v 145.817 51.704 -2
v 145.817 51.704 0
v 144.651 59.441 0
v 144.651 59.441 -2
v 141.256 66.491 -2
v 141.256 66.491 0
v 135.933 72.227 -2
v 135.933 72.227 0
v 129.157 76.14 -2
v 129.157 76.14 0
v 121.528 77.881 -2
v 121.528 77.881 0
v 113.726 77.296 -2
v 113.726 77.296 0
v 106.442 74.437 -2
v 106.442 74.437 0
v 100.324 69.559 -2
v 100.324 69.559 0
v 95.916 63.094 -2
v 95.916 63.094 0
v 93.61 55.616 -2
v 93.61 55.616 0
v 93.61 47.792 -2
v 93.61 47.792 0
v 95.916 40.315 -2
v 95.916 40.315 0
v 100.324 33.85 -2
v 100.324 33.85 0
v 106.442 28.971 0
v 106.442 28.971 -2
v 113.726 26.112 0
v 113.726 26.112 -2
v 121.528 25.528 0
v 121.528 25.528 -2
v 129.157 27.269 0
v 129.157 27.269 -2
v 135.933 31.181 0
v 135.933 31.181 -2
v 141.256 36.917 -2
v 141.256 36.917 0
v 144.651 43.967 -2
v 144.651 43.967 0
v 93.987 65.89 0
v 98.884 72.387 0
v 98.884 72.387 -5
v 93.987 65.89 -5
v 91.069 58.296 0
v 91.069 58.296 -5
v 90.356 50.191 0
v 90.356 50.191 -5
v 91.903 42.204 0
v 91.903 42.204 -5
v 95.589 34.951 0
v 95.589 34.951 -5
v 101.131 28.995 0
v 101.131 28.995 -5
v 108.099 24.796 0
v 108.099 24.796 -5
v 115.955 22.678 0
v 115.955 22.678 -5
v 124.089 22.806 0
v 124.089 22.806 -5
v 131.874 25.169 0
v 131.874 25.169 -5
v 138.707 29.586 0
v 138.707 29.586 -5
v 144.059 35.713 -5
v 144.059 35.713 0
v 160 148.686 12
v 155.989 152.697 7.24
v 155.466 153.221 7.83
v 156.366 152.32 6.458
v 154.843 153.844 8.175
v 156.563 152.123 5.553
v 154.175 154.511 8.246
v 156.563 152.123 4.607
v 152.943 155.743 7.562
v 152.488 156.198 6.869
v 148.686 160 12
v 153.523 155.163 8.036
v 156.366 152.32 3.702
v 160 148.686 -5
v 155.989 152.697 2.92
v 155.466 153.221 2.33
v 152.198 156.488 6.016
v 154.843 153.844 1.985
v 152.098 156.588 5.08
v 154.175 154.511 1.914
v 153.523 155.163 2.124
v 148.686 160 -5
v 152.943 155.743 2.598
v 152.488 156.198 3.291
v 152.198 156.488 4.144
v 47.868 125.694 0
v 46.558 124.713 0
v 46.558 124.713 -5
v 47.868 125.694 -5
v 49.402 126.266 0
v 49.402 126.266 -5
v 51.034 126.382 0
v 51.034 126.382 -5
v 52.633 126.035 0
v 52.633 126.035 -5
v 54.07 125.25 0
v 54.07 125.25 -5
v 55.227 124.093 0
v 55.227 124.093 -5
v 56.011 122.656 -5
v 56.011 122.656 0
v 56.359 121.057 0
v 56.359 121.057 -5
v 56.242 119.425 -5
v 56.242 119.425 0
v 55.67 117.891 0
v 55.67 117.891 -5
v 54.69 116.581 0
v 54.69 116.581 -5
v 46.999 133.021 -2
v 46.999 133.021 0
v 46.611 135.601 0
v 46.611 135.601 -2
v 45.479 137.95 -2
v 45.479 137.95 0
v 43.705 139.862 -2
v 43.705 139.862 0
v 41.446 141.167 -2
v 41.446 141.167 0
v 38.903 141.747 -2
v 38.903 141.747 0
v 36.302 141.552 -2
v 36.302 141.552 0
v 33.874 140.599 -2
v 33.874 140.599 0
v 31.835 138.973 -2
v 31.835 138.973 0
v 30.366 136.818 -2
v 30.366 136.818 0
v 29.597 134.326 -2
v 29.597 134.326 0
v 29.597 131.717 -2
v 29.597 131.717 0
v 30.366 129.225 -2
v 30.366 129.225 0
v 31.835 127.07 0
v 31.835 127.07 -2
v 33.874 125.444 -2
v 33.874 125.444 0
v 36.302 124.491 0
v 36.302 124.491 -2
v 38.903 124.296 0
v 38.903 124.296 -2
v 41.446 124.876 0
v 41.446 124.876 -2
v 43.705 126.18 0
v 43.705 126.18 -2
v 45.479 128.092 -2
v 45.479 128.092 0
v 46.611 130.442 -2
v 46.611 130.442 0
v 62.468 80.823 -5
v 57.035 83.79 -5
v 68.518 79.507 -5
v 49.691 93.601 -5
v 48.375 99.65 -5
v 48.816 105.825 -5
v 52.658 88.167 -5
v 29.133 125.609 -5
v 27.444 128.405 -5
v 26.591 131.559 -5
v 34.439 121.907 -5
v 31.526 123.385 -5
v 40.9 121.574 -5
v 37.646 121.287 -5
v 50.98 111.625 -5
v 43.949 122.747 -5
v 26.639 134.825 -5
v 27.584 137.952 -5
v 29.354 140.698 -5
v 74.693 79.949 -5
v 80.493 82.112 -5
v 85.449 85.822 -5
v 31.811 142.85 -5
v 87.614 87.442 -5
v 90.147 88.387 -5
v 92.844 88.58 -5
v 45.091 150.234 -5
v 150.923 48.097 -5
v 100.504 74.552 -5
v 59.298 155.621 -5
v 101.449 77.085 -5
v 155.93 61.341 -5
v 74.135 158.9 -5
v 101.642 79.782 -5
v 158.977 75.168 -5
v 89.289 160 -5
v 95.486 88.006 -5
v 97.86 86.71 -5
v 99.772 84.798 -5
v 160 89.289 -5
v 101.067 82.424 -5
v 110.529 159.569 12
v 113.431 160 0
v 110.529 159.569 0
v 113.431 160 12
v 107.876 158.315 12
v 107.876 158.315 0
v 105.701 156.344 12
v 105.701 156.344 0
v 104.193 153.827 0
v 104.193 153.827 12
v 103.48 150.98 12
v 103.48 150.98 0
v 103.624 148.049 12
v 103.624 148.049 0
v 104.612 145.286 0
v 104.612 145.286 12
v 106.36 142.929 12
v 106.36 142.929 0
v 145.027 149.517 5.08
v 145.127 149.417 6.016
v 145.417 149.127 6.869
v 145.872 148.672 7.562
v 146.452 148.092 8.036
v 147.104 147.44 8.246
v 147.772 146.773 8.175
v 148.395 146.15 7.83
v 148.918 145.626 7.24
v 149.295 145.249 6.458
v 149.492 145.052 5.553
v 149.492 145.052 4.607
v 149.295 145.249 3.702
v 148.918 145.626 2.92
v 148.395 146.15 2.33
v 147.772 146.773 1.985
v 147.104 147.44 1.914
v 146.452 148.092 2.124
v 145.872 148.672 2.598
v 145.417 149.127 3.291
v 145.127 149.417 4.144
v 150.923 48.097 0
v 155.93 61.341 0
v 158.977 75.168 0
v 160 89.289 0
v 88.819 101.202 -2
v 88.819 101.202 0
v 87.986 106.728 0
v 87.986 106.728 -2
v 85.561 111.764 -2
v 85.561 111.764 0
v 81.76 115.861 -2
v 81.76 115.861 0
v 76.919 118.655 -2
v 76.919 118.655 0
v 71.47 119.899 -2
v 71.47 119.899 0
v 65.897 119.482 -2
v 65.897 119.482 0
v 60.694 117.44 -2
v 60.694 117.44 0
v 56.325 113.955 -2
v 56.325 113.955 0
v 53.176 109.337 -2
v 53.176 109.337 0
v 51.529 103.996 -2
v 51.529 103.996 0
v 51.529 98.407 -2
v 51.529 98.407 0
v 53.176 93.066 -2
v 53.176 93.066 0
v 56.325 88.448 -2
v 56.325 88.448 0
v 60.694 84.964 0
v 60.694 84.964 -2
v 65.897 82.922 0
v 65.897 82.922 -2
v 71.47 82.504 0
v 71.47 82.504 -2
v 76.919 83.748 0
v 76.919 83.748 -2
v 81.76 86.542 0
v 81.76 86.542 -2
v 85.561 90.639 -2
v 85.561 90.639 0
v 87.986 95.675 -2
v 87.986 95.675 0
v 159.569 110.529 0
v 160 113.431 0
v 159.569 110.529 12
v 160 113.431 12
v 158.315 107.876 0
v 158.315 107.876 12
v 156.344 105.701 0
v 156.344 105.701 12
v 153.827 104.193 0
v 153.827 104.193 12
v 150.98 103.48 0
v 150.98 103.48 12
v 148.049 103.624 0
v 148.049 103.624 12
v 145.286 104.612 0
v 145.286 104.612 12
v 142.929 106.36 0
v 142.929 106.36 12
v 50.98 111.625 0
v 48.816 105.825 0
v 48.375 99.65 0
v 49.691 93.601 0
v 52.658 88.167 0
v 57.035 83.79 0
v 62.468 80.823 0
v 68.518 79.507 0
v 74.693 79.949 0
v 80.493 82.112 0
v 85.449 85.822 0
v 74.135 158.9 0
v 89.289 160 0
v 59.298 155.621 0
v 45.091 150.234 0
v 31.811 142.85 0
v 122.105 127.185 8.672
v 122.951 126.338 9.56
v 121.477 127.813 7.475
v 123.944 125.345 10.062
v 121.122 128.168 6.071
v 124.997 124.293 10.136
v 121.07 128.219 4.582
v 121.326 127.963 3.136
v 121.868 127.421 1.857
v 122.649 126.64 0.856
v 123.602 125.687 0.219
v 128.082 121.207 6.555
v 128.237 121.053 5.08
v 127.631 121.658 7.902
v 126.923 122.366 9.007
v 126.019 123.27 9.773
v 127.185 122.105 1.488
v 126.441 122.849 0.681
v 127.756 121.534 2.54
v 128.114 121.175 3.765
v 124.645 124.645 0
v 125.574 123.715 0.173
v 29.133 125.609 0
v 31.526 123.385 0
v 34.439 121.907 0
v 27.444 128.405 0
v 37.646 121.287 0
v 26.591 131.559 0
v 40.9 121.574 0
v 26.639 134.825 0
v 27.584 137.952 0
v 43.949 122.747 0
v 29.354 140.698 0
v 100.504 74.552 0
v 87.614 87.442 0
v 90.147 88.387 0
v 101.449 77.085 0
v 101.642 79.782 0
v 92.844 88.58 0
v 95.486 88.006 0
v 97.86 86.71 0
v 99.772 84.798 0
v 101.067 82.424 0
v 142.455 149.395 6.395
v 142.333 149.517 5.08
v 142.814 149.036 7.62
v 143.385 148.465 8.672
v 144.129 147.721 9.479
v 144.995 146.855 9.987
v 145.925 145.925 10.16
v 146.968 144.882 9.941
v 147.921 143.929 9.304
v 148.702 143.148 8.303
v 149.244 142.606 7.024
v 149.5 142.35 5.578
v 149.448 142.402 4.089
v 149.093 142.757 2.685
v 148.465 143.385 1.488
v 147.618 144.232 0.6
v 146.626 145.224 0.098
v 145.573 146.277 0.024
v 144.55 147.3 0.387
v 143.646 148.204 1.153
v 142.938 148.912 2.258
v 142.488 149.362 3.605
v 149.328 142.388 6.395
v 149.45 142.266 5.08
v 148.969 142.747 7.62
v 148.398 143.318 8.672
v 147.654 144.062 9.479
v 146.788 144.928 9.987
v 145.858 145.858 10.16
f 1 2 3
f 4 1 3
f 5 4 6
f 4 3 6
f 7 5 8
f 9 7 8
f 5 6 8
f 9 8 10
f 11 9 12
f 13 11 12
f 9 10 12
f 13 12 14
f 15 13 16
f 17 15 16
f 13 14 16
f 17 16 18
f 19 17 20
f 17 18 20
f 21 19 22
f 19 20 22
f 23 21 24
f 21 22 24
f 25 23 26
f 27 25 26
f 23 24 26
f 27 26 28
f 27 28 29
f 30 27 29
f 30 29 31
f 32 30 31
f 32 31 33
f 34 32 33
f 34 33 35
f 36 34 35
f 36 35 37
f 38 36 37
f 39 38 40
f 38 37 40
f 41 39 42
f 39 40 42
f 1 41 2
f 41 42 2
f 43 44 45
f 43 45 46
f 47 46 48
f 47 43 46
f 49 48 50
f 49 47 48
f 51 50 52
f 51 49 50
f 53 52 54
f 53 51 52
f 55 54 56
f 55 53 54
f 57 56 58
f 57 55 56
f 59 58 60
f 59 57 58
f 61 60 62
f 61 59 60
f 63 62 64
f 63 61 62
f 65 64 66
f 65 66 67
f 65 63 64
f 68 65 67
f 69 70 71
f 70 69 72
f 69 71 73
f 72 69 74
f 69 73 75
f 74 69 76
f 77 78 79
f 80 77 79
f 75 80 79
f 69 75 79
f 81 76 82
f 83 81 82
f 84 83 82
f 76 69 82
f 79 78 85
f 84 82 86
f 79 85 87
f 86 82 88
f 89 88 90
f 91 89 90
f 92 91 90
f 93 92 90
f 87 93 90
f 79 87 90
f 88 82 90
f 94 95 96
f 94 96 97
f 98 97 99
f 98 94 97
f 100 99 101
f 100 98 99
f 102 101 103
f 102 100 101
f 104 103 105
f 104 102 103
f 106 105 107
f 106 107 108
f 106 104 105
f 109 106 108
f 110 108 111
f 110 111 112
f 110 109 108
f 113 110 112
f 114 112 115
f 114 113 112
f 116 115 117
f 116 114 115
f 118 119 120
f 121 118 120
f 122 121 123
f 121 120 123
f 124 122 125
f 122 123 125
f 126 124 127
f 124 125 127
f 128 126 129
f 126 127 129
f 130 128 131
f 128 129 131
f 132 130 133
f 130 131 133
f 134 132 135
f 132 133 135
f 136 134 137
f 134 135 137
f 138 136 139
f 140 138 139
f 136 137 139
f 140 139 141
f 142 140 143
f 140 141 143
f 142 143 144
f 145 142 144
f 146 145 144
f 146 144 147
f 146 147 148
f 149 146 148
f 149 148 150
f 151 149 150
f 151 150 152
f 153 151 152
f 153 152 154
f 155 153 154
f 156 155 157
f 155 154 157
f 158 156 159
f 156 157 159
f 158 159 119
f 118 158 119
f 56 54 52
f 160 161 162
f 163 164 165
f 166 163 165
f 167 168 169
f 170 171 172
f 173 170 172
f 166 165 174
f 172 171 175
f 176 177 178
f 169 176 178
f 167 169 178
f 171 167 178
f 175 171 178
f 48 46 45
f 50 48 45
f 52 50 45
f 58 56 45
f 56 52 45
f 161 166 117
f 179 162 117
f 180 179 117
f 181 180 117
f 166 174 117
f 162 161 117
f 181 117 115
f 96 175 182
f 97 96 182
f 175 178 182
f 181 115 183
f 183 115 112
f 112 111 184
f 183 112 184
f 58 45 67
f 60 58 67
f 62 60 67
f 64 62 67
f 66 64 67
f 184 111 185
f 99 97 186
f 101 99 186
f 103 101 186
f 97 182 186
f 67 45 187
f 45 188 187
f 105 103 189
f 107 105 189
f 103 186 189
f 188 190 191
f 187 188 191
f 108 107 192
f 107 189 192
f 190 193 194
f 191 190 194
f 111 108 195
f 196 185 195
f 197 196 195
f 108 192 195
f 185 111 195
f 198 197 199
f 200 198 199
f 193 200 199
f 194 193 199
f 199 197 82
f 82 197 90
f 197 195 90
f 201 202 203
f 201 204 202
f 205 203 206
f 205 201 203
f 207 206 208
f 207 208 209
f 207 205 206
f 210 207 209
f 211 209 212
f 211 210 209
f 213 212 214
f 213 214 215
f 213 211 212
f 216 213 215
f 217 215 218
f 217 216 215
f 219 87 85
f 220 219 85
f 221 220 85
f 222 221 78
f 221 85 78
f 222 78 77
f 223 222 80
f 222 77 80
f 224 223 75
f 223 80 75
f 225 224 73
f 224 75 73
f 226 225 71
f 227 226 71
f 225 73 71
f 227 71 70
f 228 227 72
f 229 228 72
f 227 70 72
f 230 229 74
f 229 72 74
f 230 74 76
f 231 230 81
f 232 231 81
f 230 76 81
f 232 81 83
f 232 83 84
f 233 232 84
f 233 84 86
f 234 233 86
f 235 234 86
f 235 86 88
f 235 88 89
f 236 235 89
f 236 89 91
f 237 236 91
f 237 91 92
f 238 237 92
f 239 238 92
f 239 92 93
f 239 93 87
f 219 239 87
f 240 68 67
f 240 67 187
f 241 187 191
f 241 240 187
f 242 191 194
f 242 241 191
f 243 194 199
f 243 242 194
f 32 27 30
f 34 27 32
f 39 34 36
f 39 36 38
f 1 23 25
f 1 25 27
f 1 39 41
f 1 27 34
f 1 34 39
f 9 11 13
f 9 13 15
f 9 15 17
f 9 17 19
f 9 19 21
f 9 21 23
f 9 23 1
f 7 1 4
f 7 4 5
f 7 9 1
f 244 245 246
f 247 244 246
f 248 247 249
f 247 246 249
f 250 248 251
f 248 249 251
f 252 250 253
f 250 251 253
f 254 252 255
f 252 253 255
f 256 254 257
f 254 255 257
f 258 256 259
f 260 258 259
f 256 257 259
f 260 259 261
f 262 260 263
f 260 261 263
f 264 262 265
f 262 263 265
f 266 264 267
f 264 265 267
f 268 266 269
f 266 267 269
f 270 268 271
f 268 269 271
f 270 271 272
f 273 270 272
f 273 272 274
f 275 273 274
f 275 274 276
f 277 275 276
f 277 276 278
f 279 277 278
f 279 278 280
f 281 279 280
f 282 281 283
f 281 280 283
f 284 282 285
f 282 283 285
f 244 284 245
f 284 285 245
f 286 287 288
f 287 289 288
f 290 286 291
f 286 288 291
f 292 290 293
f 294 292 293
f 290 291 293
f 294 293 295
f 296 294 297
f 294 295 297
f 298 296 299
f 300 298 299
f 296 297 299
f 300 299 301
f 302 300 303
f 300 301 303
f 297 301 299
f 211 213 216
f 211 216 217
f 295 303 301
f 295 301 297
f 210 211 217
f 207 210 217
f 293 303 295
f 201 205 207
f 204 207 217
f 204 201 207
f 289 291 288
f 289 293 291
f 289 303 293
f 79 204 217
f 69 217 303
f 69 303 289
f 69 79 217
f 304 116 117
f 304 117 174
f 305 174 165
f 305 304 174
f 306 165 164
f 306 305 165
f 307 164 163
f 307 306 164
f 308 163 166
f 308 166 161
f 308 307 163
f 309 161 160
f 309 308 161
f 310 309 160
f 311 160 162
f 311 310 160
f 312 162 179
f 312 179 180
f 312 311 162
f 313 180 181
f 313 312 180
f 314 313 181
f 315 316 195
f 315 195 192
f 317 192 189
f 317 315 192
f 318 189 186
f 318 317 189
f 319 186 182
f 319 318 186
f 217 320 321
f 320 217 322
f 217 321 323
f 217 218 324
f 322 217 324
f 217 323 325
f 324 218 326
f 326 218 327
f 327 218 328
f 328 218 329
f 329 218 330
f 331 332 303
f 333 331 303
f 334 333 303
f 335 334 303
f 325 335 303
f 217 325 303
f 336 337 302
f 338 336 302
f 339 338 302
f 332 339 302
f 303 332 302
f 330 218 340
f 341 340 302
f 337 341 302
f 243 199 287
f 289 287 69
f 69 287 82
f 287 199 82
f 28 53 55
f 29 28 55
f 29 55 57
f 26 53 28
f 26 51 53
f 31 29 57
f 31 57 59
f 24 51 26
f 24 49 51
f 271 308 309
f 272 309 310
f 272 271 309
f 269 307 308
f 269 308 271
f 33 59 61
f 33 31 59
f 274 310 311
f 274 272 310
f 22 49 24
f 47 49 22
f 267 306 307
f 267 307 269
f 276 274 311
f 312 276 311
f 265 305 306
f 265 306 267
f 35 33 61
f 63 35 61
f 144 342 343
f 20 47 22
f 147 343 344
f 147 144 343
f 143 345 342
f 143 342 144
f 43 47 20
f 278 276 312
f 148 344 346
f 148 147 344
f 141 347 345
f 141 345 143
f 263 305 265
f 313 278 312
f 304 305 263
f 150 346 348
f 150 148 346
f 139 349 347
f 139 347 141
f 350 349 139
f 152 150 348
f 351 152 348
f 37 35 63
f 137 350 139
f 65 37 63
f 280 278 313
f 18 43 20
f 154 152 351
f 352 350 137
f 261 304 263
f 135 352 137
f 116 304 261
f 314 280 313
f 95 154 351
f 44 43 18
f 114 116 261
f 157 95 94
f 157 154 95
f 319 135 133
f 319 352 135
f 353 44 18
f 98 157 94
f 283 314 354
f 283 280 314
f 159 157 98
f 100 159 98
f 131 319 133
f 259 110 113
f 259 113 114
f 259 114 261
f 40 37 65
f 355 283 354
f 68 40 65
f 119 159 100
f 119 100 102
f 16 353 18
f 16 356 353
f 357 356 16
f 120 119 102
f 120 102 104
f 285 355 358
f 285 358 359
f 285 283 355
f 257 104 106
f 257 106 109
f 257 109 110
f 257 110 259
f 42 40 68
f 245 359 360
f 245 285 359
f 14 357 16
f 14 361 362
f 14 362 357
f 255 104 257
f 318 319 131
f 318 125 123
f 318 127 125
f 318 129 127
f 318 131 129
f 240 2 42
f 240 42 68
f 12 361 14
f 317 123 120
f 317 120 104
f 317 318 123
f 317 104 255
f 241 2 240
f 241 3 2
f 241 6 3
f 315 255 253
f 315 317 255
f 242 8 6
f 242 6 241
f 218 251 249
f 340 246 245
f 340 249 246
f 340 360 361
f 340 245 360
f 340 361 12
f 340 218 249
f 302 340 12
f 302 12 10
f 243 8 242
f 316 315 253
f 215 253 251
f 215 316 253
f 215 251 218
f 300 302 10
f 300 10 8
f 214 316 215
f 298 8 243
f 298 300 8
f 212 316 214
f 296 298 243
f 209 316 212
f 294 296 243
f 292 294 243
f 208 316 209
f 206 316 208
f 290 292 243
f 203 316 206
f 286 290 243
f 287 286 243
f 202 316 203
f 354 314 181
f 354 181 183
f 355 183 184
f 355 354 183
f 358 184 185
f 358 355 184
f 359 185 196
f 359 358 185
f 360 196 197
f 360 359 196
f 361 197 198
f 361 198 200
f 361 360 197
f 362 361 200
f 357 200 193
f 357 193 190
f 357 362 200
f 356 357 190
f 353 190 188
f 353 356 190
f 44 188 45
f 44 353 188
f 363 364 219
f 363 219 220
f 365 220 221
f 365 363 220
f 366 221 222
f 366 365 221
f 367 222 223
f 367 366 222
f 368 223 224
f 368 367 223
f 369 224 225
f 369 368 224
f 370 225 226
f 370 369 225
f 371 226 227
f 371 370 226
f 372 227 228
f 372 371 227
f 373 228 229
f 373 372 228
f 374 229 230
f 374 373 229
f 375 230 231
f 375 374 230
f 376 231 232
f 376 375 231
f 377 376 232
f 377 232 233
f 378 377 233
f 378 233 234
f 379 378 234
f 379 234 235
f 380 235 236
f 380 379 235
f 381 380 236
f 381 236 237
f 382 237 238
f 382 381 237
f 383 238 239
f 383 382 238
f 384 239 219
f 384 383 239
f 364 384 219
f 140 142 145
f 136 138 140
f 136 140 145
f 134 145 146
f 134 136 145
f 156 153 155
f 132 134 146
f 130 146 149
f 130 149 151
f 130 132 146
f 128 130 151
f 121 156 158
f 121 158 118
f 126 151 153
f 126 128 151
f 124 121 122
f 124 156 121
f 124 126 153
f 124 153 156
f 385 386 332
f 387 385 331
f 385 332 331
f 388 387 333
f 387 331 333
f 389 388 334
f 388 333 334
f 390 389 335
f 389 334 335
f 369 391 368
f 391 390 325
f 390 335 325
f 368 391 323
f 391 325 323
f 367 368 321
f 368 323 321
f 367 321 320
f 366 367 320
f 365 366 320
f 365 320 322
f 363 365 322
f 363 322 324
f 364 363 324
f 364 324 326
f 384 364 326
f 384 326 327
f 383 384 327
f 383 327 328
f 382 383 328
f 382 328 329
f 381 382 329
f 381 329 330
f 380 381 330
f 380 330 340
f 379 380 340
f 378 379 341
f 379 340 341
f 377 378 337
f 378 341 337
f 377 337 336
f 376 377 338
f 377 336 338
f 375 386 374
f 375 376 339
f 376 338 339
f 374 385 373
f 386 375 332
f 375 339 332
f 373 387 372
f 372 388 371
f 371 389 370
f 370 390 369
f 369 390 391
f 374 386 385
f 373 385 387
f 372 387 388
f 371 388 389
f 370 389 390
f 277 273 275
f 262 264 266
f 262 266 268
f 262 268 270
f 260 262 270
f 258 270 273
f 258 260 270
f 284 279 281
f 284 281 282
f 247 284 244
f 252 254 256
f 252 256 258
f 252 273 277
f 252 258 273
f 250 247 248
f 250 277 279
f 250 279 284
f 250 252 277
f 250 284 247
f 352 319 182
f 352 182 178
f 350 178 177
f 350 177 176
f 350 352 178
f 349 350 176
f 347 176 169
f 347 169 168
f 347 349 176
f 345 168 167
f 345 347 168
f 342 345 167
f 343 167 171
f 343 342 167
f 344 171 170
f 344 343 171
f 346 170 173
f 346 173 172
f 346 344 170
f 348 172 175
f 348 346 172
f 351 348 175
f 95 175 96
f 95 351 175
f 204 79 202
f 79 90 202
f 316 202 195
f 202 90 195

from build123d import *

# Parameters (mm, degrees)
F1_DEPTH     = 5
F2_R         = 8.75
F2_R_2       = 18.75
F2_R_3       = 26.25
F3_DEPTH     = 2
F5_DEPTH     = 12
F6_R         = 3.175
F7_DEPTH     = 183.6597451804
F8_R         = 5.08
F9_DEPTH     = 30
F10_S5_R     = 5.08
F10_T6_DEPTH = 9
F11_R        = 10


# Not quite as in the source:
# - a fillet or chamfer that OpenCascade refuses, or shapes differently, is made with other operations: its cross-section is extruded or revolved along the edge and cut away or added


with BuildPart() as f1:
    # F0 (on Top) → F1 (new body)
    with BuildSketch(Plane.XY):
        with BuildLine():
            ThreePointArc((89.2893218813, 160), (59.2982241526, 155.6212032378), (31.8110246399, 142.8503901468))
            ThreePointArc((31.8110246399, 142.8503901468), (29.1326558006, 125.6088436513), (46.5579786953, 124.7129043596))
            ThreePointArc((46.5579786953, 124.7129043596), (54.6897066789, 124.7129043596), (54.6897066789, 116.581176376))
            ThreePointArc((54.6897066789, 116.581176376), (54.6897066789, 85.8220313944), (85.4488516605, 85.8220313944))
            ThreePointArc((85.4488516605, 85.8220313944), (98.8838805031, 85.8220313944), (98.8838805031, 72.3870025518))
            ThreePointArc((98.8838805031, 72.3870025518), (101.1313528665, 28.995133397), (144.0588384666, 35.7134978428))
            ThreePointArc((144.0588384666, 35.7134978428), (155.9302038799, 61.3407550467), (160, 89.2893218813))
            Line((160, 89.2893218813), (160, 148.686291501))
            Line((160, 148.686291501), (148.686291501, 160))
            Line((148.686291501, 160), (89.2893218813, 160))
        make_face()
    extrude(amount=-F1_DEPTH)

    # F2 (on Top) → F3 (cut)
    with BuildSketch(Plane.XY):
        with Locations((38.2494740163, 133.0214090386)):
            Circle(F2_R)
        with Locations((70.0692791697, 101.2016038852)):
            Circle(F2_R_2)
        with Locations((119.5667538528, 51.7041292021)):
            Circle(F2_R_3)
    extrude(amount=-F3_DEPTH, mode=Mode.SUBTRACT)

    # F4 (on Top) → F5 (join)
    with BuildSketch(Plane.XY):
        Polygon((160, 148.686291501), (148.686291501, 160), (89.2893218813, 160), (160, 89.2893218813), align=None)
    extrude(amount=F5_DEPTH)

    # F6 (on face) → F7 (cut, through all)
    with BuildSketch(Plane(origin=(154.3431457505, 154.3431457505, 0), x_dir=(-0.7071067812, 0.7071067812, 0), z_dir=(0.7071067812, 0.7071067812, 0))):
        with Locations((0, 5.08)):
            Circle(F6_R)
    extrude(amount=-F7_DEPTH, mode=Mode.SUBTRACT)

    # F8 (on face) → F9 (cut)
    with BuildSketch(Plane(origin=(124.6446609407, 124.6446609407, 0), x_dir=(0.7071067812, -0.7071067812, 0), z_dir=(-0.7071067812, -0.7071067812, 0))):
        with Locations((0, 5.08)):
            Circle(F8_R)
    extrude(amount=-F9_DEPTH, mode=Mode.SUBTRACT)

    # F10: chamfer of 2 on 1 edges, made by hand


with BuildPart() as f10_tool2:
    # F10_s3 → F10_t4 (revolve)
    with BuildSketch(Plane.XY.offset(5.08)):
        Polygon((145.0270139084, 149.5171419689), (142.1985867836, 149.5171419689), (143.612800346, 148.1029284065), align=None)
    revolve(axis=Axis((145.8578643763, 145.8578643763, 5.08), (0.7071067812, 0.7071067812, 0)))

    # F10_s5 → F10_t6 (intersect, symmetric)
    with BuildSketch(Plane(origin=(145.8761289588, 145.8761289588, 0), x_dir=(0, 0, 1), z_dir=(-0.7071067812, -0.7071067812, 0))):
        with Locations((5.08, 0)):
            Circle(F10_S5_R)
    extrude(amount=F10_T6_DEPTH, both=True, mode=Mode.INTERSECT)


with BuildPart() as f1_1:
    add(f1.part)

    # F10_t1: cut F10_tool2
    add(f10_tool2.part, mode=Mode.SUBTRACT)

    # F11
    f11_edges = [f1_1.edges().sort_by_distance(p)[0] for p in [
        (160, 89.289322, 6),
        (89.289322, 160, 6),
    ]]
    fillet(f11_edges, radius=F11_R)


solid = f1_1.part
